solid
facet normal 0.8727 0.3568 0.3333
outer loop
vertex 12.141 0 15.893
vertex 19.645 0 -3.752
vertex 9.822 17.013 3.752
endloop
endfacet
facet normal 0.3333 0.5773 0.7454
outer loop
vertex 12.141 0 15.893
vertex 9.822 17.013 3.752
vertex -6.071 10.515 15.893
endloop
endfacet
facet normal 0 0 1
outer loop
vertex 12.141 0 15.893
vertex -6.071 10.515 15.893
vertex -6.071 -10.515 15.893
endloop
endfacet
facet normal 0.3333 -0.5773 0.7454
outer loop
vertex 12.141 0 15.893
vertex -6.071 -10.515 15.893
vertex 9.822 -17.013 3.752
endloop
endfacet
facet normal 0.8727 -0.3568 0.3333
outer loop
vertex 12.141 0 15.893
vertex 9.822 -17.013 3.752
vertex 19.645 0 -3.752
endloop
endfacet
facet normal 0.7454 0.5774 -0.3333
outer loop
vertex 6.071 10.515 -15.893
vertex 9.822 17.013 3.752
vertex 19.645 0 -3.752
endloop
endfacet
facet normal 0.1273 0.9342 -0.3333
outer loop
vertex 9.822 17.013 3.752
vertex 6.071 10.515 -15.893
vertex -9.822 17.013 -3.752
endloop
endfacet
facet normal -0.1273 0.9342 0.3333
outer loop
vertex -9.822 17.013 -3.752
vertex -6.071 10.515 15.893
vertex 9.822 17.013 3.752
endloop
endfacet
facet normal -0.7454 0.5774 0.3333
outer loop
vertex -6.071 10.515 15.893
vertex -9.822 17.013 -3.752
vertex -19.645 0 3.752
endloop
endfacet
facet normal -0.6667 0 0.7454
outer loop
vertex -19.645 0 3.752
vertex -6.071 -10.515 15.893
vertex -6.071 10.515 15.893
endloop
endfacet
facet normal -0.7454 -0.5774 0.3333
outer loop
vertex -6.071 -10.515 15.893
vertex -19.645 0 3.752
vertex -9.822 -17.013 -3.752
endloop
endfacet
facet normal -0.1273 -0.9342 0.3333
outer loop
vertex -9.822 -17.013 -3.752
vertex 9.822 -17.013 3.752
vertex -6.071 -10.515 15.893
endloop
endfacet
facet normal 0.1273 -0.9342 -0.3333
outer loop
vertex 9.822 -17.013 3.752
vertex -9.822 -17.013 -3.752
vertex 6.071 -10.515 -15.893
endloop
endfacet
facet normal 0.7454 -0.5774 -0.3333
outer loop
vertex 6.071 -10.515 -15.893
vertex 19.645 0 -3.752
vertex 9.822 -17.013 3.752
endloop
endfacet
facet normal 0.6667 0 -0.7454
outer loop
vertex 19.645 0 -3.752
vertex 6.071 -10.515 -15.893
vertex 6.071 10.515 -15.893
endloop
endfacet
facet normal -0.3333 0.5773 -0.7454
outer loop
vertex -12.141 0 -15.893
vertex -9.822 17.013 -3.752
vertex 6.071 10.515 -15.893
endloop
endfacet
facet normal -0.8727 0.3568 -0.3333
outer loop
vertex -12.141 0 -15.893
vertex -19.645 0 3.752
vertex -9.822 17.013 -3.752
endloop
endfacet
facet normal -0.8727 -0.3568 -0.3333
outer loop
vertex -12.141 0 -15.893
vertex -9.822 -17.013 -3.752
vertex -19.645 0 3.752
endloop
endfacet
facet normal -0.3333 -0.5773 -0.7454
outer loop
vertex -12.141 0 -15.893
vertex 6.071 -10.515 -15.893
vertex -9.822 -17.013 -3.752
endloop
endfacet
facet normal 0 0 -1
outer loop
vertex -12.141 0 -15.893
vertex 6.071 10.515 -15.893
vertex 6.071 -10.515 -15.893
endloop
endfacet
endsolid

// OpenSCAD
//!OpenSCAD

r = 20;
sideZ = r / sqrt(5);
sideX = 2 * sideZ;

function row(angle, sign) = angle < 360 ? concat([[cos(angle)*sideX, sin(angle)*sideX, sign*sideZ]], row(angle + 72, sign)) : [];

icosaVertexes = concat(
    [[0, 0, r]],
    row(0, 1),
    row(36, -1),
    [[0, 0, -r]]
);

icosaFaces = [
    // top 5
    [2, 1, 0],
    [3, 2, 0],
    [4, 3, 0],
    [5, 4, 0],
    [1, 5, 0],
    // middle 10
    [1, 2, 6], [7, 6, 2],
    [2, 3, 7], [8, 7, 3],
    [3, 4, 8], [9, 8, 4],
    [4, 5, 9], [10, 9, 5],
    [5, 1, 10], [6, 10, 1],
    // bottom 5
    [6, 7, 11],
    [7, 8, 11],
    [8, 9, 11],
    [9, 10, 11],
    [10, 6, 11]
];

rotate([0, atan(3 - sqrt(5)), 0])
polyhedron(points = icosaVertexes, faces = icosaFaces);
